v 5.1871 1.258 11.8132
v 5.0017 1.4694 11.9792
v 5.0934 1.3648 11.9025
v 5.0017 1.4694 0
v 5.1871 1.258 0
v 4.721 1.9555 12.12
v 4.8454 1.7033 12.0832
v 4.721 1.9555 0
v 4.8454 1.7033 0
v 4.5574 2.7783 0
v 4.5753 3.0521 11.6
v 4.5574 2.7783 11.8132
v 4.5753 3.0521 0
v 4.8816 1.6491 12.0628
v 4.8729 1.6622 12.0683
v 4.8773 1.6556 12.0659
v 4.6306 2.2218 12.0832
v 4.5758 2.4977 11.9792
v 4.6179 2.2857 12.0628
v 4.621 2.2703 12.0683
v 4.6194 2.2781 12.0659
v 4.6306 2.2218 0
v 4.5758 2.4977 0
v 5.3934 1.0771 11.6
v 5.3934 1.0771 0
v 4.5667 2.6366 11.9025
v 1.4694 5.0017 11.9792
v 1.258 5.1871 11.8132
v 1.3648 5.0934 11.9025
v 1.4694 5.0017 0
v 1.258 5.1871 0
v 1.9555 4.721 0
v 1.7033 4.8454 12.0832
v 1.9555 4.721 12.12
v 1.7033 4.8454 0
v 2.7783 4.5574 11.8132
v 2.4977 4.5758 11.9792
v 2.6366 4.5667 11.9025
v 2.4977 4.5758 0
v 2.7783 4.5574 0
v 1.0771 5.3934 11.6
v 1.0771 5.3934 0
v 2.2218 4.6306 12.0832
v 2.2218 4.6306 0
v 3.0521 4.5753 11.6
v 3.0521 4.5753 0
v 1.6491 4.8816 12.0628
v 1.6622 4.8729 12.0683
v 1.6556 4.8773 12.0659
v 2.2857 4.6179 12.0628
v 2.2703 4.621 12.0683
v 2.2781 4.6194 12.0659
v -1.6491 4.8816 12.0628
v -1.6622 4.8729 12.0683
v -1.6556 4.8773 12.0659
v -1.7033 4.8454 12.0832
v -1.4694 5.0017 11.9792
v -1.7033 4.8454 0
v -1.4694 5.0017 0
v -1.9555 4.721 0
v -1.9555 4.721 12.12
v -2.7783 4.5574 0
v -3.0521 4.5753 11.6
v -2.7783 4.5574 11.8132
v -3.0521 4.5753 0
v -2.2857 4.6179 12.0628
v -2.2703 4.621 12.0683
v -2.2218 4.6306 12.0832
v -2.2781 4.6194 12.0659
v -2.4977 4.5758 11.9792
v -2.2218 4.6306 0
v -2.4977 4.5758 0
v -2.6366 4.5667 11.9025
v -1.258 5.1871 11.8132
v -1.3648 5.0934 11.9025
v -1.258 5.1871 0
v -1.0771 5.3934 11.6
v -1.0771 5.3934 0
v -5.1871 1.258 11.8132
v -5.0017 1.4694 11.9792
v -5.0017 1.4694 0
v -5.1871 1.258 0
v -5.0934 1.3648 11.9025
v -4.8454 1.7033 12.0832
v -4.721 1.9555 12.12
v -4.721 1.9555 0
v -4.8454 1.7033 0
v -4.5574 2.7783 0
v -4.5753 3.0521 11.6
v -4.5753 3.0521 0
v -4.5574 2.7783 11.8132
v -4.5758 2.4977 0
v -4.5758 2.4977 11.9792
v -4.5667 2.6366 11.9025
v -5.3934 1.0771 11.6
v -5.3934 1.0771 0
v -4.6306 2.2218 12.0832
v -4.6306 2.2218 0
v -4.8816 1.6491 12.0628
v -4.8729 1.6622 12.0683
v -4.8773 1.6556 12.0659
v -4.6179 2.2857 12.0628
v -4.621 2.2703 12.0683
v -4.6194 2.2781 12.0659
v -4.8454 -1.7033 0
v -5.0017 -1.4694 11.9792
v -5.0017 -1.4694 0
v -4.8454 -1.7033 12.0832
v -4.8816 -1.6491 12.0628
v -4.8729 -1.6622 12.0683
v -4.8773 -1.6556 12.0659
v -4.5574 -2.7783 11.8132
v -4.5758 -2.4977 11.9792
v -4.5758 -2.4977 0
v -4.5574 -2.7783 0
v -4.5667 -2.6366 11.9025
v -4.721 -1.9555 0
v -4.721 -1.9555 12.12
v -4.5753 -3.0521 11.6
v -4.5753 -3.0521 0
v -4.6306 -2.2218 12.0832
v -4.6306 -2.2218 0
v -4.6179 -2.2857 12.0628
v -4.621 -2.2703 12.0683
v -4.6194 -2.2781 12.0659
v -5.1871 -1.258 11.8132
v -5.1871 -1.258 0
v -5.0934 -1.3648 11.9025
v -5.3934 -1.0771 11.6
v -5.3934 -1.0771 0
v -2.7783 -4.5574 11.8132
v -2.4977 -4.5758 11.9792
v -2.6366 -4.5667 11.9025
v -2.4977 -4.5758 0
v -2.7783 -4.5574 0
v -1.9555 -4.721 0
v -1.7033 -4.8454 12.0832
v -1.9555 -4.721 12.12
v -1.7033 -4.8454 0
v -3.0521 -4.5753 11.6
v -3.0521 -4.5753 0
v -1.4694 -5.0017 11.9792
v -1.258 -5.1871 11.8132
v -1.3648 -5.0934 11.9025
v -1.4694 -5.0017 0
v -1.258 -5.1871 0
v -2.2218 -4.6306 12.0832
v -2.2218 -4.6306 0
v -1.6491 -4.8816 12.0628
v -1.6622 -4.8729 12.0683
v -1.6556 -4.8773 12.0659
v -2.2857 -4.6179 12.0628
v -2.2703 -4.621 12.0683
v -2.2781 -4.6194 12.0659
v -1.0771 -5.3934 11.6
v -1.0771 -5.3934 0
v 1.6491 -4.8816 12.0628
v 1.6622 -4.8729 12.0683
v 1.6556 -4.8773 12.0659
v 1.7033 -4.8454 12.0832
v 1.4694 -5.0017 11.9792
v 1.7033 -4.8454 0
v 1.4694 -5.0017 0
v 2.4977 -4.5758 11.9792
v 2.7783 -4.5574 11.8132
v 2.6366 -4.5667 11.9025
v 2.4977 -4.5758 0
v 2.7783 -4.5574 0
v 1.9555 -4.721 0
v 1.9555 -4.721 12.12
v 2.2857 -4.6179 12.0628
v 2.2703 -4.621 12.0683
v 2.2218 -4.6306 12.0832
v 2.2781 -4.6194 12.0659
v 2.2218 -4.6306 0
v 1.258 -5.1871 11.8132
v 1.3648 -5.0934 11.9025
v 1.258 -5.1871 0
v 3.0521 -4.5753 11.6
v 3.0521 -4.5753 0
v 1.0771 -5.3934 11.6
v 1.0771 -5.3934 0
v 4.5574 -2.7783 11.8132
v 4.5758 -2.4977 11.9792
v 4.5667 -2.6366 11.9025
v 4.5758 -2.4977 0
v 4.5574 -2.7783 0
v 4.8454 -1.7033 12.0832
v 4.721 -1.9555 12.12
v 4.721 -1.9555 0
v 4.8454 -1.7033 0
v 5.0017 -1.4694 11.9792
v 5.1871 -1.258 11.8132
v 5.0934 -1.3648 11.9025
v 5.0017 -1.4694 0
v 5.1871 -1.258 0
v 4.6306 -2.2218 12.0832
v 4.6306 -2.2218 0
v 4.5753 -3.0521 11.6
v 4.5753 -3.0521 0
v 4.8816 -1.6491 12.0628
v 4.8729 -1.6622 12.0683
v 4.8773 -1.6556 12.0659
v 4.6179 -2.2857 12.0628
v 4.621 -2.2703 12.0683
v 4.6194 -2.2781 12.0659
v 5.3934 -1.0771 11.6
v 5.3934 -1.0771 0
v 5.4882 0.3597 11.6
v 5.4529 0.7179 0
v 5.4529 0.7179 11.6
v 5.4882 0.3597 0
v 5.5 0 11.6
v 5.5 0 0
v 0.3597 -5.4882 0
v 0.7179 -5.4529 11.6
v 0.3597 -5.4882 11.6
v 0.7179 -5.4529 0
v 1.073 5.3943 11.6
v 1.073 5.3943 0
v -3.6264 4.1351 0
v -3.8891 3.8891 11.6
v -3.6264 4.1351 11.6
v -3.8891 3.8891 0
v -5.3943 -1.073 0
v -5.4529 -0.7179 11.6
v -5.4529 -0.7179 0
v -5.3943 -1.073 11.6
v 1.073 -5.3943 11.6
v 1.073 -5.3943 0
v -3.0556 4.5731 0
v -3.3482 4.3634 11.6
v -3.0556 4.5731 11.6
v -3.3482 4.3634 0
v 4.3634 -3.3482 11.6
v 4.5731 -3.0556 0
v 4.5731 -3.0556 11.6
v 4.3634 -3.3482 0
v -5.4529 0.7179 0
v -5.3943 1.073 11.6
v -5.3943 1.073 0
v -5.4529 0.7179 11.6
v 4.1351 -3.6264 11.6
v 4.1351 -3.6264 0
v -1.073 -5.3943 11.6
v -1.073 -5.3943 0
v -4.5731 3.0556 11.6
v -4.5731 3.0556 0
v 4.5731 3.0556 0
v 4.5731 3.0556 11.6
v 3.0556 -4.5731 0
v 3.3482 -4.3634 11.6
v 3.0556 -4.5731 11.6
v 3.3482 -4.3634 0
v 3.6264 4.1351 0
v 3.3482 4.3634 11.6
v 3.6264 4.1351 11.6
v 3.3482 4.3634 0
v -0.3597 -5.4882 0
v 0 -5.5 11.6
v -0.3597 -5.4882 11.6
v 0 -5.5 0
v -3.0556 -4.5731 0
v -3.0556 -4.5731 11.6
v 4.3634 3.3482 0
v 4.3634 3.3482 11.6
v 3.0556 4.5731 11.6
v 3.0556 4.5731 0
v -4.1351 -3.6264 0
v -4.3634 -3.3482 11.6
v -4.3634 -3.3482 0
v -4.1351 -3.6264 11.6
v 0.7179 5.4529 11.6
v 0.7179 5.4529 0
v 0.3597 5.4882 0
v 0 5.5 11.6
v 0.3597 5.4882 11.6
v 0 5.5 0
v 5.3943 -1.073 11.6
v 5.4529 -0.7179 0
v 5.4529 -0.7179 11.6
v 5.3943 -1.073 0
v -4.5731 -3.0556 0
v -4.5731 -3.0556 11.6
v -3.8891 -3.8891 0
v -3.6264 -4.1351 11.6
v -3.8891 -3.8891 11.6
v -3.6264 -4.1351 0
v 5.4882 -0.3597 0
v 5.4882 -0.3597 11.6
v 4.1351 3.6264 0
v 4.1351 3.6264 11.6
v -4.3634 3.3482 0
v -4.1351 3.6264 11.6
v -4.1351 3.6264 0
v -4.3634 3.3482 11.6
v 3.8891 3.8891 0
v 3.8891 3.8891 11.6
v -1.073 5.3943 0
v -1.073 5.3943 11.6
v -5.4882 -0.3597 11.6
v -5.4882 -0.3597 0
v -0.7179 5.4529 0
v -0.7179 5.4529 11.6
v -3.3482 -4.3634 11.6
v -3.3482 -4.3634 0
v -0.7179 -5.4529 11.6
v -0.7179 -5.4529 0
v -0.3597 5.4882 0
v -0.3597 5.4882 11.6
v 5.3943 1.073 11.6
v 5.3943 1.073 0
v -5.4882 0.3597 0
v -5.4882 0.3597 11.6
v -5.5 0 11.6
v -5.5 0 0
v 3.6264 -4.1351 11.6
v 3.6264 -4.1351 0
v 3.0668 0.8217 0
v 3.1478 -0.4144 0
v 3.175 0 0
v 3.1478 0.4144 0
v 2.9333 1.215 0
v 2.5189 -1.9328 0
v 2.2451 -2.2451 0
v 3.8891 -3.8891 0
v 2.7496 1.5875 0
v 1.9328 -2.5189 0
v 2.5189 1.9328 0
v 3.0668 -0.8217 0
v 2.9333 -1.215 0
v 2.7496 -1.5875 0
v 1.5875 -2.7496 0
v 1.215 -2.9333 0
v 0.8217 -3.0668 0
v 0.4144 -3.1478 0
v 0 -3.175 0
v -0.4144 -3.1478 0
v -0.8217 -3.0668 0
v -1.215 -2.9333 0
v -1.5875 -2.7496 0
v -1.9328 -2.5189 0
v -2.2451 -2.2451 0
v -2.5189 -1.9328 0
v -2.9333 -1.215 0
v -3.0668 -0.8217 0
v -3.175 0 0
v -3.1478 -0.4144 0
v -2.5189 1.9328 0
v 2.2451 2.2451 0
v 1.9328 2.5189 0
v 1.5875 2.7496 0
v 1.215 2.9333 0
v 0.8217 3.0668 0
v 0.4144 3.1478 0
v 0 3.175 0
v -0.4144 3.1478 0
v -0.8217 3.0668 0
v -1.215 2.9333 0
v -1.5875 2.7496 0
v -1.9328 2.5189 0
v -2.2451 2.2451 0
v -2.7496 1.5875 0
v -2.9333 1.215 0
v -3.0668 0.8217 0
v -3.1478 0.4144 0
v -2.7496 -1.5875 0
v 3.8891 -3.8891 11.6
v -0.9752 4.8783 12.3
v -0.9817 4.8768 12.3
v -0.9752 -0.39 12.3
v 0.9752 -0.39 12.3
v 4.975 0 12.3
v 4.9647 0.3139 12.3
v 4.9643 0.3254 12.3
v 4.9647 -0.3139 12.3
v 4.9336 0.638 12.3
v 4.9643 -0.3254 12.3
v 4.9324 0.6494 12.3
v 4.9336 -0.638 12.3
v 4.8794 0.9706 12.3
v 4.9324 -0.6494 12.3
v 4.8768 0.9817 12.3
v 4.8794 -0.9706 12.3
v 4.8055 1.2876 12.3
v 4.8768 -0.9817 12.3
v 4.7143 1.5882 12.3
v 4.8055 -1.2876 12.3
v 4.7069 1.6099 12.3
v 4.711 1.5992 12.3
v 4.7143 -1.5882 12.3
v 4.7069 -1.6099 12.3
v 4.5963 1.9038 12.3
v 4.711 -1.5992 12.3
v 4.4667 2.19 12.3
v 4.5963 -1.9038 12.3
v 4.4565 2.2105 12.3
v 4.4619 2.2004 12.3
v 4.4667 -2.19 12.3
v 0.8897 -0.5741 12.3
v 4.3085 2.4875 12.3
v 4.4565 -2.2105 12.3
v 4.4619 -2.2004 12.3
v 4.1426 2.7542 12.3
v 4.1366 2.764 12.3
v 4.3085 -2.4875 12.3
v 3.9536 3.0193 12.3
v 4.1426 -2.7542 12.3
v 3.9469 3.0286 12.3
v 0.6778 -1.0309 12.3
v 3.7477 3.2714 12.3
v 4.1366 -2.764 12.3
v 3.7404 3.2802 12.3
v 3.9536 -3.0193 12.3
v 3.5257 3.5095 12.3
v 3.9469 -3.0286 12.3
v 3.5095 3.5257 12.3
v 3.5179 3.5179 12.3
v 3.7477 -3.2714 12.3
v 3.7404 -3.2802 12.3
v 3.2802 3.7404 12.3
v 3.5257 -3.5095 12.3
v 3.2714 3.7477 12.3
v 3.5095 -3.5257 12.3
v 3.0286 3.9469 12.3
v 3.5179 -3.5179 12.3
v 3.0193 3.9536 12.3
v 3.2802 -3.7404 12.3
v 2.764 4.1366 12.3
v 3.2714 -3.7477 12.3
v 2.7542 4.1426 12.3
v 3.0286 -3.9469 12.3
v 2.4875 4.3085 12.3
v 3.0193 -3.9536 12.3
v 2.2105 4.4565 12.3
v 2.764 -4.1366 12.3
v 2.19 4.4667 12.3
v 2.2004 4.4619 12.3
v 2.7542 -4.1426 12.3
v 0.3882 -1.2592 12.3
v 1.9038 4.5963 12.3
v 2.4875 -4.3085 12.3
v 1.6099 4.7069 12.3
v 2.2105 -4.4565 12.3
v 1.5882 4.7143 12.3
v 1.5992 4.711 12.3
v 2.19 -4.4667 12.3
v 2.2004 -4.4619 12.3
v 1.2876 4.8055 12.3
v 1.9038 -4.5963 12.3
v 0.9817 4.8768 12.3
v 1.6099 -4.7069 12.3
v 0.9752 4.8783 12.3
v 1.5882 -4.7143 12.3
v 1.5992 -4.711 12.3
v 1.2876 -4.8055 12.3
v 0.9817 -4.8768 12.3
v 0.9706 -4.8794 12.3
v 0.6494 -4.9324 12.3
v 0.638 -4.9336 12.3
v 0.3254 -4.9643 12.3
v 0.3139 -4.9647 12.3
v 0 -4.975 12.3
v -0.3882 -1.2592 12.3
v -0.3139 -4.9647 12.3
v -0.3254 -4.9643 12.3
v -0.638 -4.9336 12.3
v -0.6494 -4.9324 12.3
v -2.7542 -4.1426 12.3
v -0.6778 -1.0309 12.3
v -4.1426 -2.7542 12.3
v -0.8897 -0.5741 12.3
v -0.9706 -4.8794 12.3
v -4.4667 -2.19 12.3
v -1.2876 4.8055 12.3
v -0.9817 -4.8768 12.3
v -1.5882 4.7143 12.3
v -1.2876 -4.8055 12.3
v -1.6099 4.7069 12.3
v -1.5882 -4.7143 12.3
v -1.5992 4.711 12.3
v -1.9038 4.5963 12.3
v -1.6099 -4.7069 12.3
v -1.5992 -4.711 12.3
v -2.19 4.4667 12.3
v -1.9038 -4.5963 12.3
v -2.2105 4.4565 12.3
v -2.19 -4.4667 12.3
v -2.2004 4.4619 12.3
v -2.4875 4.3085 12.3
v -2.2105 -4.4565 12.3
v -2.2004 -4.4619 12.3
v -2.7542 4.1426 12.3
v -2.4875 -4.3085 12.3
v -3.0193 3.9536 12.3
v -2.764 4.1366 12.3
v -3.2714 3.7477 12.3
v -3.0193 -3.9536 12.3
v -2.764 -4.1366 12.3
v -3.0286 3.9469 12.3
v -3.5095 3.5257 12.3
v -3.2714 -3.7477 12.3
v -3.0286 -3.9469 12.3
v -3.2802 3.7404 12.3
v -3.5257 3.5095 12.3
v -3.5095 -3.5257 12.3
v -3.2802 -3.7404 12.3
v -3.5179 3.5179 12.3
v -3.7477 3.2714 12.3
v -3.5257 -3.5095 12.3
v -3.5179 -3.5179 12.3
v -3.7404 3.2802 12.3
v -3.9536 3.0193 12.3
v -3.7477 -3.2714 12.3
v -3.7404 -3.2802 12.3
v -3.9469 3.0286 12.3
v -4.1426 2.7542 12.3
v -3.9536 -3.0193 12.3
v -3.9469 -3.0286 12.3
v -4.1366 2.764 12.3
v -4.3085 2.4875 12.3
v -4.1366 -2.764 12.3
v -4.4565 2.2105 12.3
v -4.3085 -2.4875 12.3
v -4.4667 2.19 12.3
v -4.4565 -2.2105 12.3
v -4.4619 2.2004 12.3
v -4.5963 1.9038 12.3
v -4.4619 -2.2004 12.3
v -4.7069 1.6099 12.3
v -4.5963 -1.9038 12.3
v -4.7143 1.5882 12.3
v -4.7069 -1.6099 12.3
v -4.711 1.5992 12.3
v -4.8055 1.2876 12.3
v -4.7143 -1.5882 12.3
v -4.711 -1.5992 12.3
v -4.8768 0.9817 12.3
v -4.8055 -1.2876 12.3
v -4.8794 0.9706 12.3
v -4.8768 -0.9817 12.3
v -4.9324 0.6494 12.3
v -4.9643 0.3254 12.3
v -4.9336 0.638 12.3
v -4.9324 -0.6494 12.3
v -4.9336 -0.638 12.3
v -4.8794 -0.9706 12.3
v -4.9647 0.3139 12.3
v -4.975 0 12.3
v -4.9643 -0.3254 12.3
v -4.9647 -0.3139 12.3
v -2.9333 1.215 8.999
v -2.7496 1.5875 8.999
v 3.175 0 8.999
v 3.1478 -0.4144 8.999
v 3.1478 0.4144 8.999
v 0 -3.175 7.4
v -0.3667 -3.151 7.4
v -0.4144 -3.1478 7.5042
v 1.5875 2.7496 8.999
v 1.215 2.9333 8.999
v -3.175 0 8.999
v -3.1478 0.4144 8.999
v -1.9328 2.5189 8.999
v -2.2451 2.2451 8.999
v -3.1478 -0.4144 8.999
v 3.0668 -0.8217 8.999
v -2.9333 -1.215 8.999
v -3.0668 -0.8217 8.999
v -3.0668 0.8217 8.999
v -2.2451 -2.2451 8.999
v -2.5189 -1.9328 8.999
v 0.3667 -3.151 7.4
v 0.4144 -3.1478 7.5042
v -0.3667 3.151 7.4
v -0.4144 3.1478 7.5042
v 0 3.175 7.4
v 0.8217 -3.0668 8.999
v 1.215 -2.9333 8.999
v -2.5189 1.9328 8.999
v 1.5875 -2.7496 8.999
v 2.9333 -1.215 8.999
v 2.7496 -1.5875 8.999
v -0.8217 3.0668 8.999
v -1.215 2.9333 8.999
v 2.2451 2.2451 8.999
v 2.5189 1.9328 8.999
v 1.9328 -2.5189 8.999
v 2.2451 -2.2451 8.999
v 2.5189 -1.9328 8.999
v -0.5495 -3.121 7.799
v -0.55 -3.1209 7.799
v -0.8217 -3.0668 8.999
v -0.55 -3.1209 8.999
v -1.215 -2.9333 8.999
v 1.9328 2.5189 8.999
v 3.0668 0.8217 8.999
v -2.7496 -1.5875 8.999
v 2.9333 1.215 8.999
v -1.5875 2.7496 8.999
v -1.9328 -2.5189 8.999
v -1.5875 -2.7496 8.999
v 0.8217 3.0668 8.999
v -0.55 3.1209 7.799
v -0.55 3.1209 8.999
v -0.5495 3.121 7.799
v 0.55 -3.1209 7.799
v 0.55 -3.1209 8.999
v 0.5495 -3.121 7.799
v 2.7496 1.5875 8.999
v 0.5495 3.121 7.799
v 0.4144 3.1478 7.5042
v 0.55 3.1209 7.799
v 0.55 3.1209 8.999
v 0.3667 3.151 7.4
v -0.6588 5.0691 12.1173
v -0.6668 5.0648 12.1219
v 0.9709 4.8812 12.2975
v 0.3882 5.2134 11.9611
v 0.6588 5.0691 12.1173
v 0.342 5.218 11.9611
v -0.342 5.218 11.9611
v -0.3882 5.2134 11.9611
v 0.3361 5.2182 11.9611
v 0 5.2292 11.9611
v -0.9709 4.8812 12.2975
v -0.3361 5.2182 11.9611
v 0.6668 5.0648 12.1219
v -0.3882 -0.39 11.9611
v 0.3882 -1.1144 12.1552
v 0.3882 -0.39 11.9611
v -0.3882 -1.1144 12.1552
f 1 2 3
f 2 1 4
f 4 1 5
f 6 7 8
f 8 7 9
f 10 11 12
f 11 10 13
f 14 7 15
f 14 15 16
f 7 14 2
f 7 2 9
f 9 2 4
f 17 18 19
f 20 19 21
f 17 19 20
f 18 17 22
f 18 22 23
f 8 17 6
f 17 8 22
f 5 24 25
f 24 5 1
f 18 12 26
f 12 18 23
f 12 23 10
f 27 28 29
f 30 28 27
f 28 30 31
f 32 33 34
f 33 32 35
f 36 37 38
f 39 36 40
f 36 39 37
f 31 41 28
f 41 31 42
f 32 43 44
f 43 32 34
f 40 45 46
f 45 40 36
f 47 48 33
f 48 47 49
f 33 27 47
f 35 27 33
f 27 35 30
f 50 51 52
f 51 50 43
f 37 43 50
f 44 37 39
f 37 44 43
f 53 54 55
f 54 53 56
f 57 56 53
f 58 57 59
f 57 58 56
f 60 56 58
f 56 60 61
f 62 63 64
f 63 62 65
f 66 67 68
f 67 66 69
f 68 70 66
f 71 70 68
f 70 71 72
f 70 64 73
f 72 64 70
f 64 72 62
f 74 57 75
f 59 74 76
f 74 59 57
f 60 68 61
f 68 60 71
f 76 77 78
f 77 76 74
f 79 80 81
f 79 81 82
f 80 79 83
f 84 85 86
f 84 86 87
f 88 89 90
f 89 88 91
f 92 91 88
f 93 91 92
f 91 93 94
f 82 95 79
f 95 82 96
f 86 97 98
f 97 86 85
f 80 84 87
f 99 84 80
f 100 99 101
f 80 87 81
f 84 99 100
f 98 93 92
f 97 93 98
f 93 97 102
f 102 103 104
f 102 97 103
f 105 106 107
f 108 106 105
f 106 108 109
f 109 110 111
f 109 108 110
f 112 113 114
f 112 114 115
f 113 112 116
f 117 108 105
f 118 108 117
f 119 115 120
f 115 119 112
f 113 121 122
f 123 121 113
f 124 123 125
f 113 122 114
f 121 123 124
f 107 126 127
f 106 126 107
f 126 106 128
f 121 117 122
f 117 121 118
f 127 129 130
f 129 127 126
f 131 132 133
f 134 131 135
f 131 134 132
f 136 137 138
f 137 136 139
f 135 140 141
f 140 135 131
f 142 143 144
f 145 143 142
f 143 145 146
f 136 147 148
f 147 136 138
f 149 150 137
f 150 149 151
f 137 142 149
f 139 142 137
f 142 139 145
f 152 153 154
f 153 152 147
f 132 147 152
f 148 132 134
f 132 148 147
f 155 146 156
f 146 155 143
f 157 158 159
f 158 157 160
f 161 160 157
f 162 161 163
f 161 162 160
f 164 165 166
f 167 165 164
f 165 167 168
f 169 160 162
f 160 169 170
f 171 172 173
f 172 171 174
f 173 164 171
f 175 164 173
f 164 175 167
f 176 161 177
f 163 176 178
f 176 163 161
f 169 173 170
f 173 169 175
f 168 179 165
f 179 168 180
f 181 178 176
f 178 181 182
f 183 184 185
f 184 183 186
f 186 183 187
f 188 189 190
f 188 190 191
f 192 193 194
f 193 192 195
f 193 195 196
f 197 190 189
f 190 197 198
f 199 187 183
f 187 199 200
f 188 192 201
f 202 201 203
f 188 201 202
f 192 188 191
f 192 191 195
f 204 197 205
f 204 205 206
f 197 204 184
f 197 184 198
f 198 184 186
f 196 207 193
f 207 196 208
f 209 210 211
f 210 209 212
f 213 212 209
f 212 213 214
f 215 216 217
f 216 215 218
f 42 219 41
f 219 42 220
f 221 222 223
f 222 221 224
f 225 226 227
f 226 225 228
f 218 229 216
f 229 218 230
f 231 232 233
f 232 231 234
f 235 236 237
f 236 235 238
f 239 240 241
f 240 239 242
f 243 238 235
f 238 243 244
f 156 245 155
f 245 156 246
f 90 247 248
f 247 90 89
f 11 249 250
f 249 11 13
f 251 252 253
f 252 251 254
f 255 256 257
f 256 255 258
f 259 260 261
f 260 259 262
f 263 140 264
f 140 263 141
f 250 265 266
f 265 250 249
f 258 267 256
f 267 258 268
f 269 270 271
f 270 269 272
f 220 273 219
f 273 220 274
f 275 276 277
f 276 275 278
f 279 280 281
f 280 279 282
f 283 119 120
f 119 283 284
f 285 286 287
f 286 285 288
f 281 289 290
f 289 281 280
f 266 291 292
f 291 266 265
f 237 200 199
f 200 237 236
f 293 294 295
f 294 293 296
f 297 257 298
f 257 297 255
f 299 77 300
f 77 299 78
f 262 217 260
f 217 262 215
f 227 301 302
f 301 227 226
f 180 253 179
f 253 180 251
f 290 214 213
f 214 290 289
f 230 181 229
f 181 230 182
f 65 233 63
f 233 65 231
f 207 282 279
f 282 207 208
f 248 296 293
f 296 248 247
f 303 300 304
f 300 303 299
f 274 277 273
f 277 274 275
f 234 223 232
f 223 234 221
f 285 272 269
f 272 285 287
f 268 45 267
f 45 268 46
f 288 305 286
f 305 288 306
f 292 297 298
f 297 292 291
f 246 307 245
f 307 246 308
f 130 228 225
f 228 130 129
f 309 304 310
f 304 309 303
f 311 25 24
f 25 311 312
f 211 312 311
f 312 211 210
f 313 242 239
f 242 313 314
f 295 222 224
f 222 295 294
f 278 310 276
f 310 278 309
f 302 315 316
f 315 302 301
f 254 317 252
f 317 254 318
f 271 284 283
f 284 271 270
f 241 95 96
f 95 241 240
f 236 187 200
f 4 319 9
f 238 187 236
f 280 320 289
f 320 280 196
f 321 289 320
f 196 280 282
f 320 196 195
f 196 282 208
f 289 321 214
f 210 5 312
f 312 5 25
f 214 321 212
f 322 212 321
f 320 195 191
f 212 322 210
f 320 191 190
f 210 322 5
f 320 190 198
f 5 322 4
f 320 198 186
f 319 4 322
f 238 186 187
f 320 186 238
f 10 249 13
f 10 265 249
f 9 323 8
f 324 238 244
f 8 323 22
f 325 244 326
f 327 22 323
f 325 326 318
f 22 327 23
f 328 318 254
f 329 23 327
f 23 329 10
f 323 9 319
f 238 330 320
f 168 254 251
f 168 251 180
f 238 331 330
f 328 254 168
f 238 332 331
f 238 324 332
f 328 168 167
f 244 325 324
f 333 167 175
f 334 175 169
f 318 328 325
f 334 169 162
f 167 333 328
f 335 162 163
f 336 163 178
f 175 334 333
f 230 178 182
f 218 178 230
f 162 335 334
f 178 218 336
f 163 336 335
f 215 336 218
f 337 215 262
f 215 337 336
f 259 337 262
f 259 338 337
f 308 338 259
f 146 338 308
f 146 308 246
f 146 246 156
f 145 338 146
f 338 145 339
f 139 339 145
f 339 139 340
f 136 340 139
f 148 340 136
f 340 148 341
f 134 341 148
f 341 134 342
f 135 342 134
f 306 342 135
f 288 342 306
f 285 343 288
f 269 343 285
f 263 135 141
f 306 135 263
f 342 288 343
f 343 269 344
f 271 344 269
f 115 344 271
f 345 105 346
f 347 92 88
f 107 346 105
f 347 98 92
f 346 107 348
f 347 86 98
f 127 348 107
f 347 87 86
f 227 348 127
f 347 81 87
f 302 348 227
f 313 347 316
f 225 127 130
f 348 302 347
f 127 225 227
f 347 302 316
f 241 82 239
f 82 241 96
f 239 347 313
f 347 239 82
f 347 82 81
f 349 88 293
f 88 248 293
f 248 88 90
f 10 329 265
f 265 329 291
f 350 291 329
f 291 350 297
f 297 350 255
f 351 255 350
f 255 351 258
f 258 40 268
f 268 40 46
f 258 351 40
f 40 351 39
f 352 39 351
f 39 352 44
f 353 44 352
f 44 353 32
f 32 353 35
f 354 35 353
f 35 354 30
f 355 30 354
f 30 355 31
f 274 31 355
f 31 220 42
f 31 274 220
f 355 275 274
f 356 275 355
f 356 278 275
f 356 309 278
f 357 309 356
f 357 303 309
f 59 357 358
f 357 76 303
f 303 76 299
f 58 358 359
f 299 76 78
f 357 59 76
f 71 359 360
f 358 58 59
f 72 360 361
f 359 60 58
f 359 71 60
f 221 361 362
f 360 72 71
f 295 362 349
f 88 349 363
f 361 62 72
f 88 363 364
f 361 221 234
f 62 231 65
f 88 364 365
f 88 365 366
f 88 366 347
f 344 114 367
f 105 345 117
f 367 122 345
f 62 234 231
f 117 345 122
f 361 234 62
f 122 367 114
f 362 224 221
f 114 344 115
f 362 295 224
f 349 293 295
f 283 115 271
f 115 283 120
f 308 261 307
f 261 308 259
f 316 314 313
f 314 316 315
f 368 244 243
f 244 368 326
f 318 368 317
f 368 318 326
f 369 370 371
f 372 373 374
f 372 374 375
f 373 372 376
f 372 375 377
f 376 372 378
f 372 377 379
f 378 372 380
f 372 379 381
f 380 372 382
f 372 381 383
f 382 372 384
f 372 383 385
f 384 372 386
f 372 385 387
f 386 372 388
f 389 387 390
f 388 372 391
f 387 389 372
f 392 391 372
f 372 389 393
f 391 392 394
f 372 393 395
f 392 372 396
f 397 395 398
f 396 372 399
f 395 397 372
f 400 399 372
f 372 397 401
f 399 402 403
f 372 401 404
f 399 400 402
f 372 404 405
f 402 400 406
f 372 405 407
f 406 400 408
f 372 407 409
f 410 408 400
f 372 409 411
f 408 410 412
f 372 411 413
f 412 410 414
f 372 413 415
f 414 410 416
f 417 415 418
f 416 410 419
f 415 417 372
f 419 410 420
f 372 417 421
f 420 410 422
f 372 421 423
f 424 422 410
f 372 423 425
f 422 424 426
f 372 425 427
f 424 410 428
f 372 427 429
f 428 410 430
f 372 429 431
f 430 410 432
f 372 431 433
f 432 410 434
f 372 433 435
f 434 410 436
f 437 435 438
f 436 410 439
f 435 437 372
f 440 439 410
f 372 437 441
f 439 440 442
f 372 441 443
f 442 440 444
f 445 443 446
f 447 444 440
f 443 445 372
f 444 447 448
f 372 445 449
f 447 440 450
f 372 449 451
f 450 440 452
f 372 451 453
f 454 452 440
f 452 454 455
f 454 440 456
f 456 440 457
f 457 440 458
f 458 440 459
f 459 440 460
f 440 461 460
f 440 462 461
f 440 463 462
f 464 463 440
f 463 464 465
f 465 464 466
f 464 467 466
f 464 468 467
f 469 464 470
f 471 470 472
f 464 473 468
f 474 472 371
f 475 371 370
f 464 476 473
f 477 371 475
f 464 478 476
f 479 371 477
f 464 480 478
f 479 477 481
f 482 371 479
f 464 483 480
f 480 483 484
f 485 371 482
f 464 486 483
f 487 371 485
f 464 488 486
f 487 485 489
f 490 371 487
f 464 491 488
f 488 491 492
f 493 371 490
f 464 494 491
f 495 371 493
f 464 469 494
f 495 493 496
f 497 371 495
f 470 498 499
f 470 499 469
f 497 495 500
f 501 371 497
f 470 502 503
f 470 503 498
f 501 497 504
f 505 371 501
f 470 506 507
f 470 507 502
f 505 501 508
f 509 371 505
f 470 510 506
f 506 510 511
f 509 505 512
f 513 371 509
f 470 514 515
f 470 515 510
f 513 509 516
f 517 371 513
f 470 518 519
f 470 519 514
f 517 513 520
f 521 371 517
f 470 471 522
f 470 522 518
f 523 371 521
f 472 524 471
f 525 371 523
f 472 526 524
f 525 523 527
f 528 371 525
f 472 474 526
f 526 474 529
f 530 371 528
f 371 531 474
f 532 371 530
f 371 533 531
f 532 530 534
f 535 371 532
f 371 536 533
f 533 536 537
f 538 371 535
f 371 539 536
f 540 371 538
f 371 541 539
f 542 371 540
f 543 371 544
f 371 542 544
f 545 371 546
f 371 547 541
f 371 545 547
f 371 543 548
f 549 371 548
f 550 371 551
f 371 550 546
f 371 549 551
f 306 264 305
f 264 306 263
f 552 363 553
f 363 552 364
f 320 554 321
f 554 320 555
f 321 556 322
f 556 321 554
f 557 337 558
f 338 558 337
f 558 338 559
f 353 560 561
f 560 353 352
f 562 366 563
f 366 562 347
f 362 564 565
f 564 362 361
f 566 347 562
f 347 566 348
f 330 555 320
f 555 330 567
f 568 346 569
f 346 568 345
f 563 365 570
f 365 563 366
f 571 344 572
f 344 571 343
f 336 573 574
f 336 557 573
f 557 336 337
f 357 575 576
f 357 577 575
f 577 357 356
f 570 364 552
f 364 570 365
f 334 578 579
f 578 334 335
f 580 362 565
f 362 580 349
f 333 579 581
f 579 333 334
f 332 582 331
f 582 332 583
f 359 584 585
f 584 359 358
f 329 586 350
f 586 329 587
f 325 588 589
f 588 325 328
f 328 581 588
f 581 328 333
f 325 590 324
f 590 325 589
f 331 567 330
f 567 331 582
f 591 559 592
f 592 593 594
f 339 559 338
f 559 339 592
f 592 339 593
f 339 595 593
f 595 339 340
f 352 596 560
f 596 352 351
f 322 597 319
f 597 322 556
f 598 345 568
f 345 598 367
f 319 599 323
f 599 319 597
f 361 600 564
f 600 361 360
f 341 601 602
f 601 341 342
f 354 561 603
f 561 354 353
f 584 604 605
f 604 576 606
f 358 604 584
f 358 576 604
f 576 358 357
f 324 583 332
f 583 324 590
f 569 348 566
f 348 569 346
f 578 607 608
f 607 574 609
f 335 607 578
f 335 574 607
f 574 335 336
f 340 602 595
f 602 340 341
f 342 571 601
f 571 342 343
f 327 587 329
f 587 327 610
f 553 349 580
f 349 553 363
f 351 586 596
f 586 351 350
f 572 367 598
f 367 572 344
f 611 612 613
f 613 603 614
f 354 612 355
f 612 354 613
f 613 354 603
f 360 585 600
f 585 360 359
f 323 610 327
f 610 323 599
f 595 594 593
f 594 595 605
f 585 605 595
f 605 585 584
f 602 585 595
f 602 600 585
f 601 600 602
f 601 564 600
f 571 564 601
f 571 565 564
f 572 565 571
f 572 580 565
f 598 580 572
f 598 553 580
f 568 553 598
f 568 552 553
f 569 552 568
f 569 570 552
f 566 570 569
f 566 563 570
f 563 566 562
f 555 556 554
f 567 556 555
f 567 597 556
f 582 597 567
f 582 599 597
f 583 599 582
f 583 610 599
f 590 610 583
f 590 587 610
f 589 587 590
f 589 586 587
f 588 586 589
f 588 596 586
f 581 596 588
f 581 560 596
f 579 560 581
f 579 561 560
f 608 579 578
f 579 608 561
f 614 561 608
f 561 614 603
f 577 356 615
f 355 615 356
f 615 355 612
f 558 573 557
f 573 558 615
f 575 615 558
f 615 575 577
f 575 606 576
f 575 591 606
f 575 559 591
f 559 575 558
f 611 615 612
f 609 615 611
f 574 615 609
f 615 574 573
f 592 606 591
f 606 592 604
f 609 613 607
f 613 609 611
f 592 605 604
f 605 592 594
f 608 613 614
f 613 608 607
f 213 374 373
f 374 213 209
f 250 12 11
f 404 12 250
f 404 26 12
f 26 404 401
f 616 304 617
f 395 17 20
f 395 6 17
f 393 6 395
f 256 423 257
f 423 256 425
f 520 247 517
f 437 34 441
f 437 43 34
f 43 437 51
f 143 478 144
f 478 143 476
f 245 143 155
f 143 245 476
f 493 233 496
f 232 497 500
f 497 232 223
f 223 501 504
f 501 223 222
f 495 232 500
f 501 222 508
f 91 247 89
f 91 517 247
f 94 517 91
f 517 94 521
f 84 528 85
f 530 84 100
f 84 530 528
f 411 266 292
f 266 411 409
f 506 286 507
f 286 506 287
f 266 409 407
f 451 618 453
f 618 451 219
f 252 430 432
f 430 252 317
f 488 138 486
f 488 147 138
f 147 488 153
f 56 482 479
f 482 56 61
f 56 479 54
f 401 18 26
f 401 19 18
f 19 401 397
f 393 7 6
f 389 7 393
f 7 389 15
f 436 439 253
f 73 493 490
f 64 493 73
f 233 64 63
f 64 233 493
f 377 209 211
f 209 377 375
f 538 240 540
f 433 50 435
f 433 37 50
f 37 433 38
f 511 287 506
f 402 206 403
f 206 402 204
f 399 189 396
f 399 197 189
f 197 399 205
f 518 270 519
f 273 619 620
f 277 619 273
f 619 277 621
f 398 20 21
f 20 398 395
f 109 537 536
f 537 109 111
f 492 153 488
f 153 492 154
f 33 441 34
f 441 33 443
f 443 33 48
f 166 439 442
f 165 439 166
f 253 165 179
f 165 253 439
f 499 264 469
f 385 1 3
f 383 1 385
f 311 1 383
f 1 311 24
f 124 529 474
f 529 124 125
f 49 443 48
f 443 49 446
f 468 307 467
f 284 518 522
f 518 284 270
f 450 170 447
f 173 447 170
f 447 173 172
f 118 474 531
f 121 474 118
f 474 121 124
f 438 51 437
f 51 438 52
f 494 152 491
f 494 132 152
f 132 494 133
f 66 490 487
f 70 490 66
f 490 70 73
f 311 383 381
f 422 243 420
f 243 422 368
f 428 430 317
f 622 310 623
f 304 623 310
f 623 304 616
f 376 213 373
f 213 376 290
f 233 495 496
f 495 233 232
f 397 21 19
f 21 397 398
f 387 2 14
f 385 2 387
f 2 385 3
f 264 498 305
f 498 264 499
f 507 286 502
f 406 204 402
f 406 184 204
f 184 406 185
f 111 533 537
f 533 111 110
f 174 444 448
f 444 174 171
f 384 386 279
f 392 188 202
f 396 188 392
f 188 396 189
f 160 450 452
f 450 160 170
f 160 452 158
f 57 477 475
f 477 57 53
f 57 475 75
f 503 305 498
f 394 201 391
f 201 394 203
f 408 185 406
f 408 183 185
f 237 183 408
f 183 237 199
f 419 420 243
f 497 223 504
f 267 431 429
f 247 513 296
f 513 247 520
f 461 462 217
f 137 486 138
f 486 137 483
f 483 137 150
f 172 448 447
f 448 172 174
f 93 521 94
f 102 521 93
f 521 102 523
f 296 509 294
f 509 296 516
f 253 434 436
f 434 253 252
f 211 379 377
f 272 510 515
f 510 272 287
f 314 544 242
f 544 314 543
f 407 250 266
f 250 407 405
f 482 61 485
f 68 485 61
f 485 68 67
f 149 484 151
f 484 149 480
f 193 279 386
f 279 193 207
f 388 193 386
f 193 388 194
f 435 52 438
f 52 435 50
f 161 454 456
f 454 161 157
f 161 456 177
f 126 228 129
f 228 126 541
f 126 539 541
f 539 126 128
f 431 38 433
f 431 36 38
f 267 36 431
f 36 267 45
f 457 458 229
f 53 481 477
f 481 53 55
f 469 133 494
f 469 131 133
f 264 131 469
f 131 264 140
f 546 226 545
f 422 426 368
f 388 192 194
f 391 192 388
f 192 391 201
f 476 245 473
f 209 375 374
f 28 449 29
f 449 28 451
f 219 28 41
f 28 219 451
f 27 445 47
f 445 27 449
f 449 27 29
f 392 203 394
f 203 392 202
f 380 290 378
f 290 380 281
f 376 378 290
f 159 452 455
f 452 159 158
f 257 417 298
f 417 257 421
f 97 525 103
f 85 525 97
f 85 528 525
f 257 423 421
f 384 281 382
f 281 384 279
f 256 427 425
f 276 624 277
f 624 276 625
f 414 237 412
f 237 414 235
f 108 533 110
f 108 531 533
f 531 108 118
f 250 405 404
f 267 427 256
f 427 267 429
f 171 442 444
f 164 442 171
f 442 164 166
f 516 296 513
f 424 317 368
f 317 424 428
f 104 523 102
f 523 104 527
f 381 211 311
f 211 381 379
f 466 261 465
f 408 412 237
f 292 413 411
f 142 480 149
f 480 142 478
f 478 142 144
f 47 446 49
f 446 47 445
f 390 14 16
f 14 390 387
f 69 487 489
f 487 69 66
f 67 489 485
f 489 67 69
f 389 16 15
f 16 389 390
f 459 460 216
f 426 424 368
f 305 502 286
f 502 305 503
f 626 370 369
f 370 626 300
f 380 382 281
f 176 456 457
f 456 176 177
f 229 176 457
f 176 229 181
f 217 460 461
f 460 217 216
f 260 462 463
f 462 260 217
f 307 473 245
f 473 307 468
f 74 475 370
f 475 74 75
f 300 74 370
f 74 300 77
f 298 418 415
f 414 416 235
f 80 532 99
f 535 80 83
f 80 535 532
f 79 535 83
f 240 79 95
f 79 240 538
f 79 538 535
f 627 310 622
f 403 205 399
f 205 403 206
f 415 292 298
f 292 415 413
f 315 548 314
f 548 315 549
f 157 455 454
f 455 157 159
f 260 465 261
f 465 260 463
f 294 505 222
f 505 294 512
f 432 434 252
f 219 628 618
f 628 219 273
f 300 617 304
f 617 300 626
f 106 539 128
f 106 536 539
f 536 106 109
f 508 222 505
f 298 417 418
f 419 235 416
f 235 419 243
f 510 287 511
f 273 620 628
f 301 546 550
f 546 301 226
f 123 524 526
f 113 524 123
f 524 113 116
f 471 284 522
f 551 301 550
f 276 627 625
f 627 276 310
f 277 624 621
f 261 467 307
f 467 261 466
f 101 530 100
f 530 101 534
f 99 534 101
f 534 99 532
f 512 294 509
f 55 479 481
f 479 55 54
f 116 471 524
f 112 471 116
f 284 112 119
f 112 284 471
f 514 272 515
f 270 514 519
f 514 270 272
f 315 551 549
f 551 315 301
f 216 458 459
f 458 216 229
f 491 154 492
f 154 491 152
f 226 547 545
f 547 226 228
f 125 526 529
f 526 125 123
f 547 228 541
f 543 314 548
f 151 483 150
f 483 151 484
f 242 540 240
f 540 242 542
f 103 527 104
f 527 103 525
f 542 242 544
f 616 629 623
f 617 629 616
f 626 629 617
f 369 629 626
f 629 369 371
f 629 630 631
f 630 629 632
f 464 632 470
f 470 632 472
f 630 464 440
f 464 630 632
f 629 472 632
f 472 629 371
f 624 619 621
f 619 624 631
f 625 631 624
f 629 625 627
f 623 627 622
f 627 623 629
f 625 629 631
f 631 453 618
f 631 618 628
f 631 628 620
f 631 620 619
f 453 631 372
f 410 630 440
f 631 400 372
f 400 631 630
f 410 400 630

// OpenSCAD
r = 11 / 2;
l = 0.001;

shaft_h = 9.0;
shaft_d = 6.35;

skirt_r = 10.7 / 2;
skirt_h = 0;//2;

top_h = 3.3;
dc = 0.39;

h = shaft_h + skirt_h + top_h;

lq = 12;
mq = 24;
hq = 48;
vhq = 96;

module knob() {
	indicator(h, r)
	cut(h - 0.7, r)
	shaft_hole(shaft_d, shaft_h, skirt_r, skirt_h)
	ribs(8, 2.15, dc)
	cylinder(h, r, r, $fn=vhq);
}

module ribs(cnt, rib_r, dr) {
	difference() {
		children();
		
		for(i = [0: cnt - 1])
		rotate(i * 360 / cnt + 180 / cnt)
		translate([r - dr + rib_r, 0, -l])
		cylinder(h + l * 2, rib_r, rib_r, $fn=hq);
	}
}

module shaft_hole(shaft_d, shaft_h, skirt_r, skirt_h) {
	difference() {
		children();

		union() {
			if(skirt_h > 0) {
				translate([0, 0, -l])
				linear_extrude(skirt_h)
				circle(skirt_r, $fn=hq);
			}

			difference() {
				translate([0, 0, -l])
				linear_extrude(shaft_h + skirt_h)
				circle(d = shaft_d, $fn=hq);

				translate([0, 0, shaft_h - 1.6 + skirt_h])
				linear_extrude(0.4, scale = [1.5, 1])
				square([1.1 / 1.5, shaft_d], center = true);
				
				translate([0, 0, shaft_h - 1.2 + skirt_h - l])
				linear_extrude(1.2 + l)
				square([1.1, shaft_d], center = true);
			}
		}
	}
}

module hl(t) {
	hull() {
		children();
		translate(t) children();
	}
}

module indicator(h, r) {
	difference() {
		children();

		sr = 1.5;
		scl = 0.6;

		translate([0, -dc, h + sr - dc])
		hl([0, r + sr, 0])
		rotate([0, 90, 0])
		sphere(sr, $fn=lq);
	}
}

module cut(h, r) {
	intersection() {
		children();
		
		union() {
			cylinder(h, r, r, $fn=vhq);
			translate([0, 0, h])
			cylinder(r, r, r / 4, $fn=vhq);
		}
	}
}

module row(cnt, offset) {
	dr = 2;
	dx = offset + dr;
	mw = 1.1;
	mo = 2.2;

	for(x = [0: cnt - 1])
	translate([dx * x, 0, 0])
	children();

	for(x=[0: cnt - 2])
	translate([dx * x + r - mo, -mw / 2, -1.8])
	difference() {
		cube([dx - r * 2 + mo * 2, mw, 2]);

		translate([mw, -l, mw])
		cube([dx - r * 2 + mo * 2 - mw * 2, mw + 2 * l, 2]);
	}
}

//row(8, r * 2)
knob();
